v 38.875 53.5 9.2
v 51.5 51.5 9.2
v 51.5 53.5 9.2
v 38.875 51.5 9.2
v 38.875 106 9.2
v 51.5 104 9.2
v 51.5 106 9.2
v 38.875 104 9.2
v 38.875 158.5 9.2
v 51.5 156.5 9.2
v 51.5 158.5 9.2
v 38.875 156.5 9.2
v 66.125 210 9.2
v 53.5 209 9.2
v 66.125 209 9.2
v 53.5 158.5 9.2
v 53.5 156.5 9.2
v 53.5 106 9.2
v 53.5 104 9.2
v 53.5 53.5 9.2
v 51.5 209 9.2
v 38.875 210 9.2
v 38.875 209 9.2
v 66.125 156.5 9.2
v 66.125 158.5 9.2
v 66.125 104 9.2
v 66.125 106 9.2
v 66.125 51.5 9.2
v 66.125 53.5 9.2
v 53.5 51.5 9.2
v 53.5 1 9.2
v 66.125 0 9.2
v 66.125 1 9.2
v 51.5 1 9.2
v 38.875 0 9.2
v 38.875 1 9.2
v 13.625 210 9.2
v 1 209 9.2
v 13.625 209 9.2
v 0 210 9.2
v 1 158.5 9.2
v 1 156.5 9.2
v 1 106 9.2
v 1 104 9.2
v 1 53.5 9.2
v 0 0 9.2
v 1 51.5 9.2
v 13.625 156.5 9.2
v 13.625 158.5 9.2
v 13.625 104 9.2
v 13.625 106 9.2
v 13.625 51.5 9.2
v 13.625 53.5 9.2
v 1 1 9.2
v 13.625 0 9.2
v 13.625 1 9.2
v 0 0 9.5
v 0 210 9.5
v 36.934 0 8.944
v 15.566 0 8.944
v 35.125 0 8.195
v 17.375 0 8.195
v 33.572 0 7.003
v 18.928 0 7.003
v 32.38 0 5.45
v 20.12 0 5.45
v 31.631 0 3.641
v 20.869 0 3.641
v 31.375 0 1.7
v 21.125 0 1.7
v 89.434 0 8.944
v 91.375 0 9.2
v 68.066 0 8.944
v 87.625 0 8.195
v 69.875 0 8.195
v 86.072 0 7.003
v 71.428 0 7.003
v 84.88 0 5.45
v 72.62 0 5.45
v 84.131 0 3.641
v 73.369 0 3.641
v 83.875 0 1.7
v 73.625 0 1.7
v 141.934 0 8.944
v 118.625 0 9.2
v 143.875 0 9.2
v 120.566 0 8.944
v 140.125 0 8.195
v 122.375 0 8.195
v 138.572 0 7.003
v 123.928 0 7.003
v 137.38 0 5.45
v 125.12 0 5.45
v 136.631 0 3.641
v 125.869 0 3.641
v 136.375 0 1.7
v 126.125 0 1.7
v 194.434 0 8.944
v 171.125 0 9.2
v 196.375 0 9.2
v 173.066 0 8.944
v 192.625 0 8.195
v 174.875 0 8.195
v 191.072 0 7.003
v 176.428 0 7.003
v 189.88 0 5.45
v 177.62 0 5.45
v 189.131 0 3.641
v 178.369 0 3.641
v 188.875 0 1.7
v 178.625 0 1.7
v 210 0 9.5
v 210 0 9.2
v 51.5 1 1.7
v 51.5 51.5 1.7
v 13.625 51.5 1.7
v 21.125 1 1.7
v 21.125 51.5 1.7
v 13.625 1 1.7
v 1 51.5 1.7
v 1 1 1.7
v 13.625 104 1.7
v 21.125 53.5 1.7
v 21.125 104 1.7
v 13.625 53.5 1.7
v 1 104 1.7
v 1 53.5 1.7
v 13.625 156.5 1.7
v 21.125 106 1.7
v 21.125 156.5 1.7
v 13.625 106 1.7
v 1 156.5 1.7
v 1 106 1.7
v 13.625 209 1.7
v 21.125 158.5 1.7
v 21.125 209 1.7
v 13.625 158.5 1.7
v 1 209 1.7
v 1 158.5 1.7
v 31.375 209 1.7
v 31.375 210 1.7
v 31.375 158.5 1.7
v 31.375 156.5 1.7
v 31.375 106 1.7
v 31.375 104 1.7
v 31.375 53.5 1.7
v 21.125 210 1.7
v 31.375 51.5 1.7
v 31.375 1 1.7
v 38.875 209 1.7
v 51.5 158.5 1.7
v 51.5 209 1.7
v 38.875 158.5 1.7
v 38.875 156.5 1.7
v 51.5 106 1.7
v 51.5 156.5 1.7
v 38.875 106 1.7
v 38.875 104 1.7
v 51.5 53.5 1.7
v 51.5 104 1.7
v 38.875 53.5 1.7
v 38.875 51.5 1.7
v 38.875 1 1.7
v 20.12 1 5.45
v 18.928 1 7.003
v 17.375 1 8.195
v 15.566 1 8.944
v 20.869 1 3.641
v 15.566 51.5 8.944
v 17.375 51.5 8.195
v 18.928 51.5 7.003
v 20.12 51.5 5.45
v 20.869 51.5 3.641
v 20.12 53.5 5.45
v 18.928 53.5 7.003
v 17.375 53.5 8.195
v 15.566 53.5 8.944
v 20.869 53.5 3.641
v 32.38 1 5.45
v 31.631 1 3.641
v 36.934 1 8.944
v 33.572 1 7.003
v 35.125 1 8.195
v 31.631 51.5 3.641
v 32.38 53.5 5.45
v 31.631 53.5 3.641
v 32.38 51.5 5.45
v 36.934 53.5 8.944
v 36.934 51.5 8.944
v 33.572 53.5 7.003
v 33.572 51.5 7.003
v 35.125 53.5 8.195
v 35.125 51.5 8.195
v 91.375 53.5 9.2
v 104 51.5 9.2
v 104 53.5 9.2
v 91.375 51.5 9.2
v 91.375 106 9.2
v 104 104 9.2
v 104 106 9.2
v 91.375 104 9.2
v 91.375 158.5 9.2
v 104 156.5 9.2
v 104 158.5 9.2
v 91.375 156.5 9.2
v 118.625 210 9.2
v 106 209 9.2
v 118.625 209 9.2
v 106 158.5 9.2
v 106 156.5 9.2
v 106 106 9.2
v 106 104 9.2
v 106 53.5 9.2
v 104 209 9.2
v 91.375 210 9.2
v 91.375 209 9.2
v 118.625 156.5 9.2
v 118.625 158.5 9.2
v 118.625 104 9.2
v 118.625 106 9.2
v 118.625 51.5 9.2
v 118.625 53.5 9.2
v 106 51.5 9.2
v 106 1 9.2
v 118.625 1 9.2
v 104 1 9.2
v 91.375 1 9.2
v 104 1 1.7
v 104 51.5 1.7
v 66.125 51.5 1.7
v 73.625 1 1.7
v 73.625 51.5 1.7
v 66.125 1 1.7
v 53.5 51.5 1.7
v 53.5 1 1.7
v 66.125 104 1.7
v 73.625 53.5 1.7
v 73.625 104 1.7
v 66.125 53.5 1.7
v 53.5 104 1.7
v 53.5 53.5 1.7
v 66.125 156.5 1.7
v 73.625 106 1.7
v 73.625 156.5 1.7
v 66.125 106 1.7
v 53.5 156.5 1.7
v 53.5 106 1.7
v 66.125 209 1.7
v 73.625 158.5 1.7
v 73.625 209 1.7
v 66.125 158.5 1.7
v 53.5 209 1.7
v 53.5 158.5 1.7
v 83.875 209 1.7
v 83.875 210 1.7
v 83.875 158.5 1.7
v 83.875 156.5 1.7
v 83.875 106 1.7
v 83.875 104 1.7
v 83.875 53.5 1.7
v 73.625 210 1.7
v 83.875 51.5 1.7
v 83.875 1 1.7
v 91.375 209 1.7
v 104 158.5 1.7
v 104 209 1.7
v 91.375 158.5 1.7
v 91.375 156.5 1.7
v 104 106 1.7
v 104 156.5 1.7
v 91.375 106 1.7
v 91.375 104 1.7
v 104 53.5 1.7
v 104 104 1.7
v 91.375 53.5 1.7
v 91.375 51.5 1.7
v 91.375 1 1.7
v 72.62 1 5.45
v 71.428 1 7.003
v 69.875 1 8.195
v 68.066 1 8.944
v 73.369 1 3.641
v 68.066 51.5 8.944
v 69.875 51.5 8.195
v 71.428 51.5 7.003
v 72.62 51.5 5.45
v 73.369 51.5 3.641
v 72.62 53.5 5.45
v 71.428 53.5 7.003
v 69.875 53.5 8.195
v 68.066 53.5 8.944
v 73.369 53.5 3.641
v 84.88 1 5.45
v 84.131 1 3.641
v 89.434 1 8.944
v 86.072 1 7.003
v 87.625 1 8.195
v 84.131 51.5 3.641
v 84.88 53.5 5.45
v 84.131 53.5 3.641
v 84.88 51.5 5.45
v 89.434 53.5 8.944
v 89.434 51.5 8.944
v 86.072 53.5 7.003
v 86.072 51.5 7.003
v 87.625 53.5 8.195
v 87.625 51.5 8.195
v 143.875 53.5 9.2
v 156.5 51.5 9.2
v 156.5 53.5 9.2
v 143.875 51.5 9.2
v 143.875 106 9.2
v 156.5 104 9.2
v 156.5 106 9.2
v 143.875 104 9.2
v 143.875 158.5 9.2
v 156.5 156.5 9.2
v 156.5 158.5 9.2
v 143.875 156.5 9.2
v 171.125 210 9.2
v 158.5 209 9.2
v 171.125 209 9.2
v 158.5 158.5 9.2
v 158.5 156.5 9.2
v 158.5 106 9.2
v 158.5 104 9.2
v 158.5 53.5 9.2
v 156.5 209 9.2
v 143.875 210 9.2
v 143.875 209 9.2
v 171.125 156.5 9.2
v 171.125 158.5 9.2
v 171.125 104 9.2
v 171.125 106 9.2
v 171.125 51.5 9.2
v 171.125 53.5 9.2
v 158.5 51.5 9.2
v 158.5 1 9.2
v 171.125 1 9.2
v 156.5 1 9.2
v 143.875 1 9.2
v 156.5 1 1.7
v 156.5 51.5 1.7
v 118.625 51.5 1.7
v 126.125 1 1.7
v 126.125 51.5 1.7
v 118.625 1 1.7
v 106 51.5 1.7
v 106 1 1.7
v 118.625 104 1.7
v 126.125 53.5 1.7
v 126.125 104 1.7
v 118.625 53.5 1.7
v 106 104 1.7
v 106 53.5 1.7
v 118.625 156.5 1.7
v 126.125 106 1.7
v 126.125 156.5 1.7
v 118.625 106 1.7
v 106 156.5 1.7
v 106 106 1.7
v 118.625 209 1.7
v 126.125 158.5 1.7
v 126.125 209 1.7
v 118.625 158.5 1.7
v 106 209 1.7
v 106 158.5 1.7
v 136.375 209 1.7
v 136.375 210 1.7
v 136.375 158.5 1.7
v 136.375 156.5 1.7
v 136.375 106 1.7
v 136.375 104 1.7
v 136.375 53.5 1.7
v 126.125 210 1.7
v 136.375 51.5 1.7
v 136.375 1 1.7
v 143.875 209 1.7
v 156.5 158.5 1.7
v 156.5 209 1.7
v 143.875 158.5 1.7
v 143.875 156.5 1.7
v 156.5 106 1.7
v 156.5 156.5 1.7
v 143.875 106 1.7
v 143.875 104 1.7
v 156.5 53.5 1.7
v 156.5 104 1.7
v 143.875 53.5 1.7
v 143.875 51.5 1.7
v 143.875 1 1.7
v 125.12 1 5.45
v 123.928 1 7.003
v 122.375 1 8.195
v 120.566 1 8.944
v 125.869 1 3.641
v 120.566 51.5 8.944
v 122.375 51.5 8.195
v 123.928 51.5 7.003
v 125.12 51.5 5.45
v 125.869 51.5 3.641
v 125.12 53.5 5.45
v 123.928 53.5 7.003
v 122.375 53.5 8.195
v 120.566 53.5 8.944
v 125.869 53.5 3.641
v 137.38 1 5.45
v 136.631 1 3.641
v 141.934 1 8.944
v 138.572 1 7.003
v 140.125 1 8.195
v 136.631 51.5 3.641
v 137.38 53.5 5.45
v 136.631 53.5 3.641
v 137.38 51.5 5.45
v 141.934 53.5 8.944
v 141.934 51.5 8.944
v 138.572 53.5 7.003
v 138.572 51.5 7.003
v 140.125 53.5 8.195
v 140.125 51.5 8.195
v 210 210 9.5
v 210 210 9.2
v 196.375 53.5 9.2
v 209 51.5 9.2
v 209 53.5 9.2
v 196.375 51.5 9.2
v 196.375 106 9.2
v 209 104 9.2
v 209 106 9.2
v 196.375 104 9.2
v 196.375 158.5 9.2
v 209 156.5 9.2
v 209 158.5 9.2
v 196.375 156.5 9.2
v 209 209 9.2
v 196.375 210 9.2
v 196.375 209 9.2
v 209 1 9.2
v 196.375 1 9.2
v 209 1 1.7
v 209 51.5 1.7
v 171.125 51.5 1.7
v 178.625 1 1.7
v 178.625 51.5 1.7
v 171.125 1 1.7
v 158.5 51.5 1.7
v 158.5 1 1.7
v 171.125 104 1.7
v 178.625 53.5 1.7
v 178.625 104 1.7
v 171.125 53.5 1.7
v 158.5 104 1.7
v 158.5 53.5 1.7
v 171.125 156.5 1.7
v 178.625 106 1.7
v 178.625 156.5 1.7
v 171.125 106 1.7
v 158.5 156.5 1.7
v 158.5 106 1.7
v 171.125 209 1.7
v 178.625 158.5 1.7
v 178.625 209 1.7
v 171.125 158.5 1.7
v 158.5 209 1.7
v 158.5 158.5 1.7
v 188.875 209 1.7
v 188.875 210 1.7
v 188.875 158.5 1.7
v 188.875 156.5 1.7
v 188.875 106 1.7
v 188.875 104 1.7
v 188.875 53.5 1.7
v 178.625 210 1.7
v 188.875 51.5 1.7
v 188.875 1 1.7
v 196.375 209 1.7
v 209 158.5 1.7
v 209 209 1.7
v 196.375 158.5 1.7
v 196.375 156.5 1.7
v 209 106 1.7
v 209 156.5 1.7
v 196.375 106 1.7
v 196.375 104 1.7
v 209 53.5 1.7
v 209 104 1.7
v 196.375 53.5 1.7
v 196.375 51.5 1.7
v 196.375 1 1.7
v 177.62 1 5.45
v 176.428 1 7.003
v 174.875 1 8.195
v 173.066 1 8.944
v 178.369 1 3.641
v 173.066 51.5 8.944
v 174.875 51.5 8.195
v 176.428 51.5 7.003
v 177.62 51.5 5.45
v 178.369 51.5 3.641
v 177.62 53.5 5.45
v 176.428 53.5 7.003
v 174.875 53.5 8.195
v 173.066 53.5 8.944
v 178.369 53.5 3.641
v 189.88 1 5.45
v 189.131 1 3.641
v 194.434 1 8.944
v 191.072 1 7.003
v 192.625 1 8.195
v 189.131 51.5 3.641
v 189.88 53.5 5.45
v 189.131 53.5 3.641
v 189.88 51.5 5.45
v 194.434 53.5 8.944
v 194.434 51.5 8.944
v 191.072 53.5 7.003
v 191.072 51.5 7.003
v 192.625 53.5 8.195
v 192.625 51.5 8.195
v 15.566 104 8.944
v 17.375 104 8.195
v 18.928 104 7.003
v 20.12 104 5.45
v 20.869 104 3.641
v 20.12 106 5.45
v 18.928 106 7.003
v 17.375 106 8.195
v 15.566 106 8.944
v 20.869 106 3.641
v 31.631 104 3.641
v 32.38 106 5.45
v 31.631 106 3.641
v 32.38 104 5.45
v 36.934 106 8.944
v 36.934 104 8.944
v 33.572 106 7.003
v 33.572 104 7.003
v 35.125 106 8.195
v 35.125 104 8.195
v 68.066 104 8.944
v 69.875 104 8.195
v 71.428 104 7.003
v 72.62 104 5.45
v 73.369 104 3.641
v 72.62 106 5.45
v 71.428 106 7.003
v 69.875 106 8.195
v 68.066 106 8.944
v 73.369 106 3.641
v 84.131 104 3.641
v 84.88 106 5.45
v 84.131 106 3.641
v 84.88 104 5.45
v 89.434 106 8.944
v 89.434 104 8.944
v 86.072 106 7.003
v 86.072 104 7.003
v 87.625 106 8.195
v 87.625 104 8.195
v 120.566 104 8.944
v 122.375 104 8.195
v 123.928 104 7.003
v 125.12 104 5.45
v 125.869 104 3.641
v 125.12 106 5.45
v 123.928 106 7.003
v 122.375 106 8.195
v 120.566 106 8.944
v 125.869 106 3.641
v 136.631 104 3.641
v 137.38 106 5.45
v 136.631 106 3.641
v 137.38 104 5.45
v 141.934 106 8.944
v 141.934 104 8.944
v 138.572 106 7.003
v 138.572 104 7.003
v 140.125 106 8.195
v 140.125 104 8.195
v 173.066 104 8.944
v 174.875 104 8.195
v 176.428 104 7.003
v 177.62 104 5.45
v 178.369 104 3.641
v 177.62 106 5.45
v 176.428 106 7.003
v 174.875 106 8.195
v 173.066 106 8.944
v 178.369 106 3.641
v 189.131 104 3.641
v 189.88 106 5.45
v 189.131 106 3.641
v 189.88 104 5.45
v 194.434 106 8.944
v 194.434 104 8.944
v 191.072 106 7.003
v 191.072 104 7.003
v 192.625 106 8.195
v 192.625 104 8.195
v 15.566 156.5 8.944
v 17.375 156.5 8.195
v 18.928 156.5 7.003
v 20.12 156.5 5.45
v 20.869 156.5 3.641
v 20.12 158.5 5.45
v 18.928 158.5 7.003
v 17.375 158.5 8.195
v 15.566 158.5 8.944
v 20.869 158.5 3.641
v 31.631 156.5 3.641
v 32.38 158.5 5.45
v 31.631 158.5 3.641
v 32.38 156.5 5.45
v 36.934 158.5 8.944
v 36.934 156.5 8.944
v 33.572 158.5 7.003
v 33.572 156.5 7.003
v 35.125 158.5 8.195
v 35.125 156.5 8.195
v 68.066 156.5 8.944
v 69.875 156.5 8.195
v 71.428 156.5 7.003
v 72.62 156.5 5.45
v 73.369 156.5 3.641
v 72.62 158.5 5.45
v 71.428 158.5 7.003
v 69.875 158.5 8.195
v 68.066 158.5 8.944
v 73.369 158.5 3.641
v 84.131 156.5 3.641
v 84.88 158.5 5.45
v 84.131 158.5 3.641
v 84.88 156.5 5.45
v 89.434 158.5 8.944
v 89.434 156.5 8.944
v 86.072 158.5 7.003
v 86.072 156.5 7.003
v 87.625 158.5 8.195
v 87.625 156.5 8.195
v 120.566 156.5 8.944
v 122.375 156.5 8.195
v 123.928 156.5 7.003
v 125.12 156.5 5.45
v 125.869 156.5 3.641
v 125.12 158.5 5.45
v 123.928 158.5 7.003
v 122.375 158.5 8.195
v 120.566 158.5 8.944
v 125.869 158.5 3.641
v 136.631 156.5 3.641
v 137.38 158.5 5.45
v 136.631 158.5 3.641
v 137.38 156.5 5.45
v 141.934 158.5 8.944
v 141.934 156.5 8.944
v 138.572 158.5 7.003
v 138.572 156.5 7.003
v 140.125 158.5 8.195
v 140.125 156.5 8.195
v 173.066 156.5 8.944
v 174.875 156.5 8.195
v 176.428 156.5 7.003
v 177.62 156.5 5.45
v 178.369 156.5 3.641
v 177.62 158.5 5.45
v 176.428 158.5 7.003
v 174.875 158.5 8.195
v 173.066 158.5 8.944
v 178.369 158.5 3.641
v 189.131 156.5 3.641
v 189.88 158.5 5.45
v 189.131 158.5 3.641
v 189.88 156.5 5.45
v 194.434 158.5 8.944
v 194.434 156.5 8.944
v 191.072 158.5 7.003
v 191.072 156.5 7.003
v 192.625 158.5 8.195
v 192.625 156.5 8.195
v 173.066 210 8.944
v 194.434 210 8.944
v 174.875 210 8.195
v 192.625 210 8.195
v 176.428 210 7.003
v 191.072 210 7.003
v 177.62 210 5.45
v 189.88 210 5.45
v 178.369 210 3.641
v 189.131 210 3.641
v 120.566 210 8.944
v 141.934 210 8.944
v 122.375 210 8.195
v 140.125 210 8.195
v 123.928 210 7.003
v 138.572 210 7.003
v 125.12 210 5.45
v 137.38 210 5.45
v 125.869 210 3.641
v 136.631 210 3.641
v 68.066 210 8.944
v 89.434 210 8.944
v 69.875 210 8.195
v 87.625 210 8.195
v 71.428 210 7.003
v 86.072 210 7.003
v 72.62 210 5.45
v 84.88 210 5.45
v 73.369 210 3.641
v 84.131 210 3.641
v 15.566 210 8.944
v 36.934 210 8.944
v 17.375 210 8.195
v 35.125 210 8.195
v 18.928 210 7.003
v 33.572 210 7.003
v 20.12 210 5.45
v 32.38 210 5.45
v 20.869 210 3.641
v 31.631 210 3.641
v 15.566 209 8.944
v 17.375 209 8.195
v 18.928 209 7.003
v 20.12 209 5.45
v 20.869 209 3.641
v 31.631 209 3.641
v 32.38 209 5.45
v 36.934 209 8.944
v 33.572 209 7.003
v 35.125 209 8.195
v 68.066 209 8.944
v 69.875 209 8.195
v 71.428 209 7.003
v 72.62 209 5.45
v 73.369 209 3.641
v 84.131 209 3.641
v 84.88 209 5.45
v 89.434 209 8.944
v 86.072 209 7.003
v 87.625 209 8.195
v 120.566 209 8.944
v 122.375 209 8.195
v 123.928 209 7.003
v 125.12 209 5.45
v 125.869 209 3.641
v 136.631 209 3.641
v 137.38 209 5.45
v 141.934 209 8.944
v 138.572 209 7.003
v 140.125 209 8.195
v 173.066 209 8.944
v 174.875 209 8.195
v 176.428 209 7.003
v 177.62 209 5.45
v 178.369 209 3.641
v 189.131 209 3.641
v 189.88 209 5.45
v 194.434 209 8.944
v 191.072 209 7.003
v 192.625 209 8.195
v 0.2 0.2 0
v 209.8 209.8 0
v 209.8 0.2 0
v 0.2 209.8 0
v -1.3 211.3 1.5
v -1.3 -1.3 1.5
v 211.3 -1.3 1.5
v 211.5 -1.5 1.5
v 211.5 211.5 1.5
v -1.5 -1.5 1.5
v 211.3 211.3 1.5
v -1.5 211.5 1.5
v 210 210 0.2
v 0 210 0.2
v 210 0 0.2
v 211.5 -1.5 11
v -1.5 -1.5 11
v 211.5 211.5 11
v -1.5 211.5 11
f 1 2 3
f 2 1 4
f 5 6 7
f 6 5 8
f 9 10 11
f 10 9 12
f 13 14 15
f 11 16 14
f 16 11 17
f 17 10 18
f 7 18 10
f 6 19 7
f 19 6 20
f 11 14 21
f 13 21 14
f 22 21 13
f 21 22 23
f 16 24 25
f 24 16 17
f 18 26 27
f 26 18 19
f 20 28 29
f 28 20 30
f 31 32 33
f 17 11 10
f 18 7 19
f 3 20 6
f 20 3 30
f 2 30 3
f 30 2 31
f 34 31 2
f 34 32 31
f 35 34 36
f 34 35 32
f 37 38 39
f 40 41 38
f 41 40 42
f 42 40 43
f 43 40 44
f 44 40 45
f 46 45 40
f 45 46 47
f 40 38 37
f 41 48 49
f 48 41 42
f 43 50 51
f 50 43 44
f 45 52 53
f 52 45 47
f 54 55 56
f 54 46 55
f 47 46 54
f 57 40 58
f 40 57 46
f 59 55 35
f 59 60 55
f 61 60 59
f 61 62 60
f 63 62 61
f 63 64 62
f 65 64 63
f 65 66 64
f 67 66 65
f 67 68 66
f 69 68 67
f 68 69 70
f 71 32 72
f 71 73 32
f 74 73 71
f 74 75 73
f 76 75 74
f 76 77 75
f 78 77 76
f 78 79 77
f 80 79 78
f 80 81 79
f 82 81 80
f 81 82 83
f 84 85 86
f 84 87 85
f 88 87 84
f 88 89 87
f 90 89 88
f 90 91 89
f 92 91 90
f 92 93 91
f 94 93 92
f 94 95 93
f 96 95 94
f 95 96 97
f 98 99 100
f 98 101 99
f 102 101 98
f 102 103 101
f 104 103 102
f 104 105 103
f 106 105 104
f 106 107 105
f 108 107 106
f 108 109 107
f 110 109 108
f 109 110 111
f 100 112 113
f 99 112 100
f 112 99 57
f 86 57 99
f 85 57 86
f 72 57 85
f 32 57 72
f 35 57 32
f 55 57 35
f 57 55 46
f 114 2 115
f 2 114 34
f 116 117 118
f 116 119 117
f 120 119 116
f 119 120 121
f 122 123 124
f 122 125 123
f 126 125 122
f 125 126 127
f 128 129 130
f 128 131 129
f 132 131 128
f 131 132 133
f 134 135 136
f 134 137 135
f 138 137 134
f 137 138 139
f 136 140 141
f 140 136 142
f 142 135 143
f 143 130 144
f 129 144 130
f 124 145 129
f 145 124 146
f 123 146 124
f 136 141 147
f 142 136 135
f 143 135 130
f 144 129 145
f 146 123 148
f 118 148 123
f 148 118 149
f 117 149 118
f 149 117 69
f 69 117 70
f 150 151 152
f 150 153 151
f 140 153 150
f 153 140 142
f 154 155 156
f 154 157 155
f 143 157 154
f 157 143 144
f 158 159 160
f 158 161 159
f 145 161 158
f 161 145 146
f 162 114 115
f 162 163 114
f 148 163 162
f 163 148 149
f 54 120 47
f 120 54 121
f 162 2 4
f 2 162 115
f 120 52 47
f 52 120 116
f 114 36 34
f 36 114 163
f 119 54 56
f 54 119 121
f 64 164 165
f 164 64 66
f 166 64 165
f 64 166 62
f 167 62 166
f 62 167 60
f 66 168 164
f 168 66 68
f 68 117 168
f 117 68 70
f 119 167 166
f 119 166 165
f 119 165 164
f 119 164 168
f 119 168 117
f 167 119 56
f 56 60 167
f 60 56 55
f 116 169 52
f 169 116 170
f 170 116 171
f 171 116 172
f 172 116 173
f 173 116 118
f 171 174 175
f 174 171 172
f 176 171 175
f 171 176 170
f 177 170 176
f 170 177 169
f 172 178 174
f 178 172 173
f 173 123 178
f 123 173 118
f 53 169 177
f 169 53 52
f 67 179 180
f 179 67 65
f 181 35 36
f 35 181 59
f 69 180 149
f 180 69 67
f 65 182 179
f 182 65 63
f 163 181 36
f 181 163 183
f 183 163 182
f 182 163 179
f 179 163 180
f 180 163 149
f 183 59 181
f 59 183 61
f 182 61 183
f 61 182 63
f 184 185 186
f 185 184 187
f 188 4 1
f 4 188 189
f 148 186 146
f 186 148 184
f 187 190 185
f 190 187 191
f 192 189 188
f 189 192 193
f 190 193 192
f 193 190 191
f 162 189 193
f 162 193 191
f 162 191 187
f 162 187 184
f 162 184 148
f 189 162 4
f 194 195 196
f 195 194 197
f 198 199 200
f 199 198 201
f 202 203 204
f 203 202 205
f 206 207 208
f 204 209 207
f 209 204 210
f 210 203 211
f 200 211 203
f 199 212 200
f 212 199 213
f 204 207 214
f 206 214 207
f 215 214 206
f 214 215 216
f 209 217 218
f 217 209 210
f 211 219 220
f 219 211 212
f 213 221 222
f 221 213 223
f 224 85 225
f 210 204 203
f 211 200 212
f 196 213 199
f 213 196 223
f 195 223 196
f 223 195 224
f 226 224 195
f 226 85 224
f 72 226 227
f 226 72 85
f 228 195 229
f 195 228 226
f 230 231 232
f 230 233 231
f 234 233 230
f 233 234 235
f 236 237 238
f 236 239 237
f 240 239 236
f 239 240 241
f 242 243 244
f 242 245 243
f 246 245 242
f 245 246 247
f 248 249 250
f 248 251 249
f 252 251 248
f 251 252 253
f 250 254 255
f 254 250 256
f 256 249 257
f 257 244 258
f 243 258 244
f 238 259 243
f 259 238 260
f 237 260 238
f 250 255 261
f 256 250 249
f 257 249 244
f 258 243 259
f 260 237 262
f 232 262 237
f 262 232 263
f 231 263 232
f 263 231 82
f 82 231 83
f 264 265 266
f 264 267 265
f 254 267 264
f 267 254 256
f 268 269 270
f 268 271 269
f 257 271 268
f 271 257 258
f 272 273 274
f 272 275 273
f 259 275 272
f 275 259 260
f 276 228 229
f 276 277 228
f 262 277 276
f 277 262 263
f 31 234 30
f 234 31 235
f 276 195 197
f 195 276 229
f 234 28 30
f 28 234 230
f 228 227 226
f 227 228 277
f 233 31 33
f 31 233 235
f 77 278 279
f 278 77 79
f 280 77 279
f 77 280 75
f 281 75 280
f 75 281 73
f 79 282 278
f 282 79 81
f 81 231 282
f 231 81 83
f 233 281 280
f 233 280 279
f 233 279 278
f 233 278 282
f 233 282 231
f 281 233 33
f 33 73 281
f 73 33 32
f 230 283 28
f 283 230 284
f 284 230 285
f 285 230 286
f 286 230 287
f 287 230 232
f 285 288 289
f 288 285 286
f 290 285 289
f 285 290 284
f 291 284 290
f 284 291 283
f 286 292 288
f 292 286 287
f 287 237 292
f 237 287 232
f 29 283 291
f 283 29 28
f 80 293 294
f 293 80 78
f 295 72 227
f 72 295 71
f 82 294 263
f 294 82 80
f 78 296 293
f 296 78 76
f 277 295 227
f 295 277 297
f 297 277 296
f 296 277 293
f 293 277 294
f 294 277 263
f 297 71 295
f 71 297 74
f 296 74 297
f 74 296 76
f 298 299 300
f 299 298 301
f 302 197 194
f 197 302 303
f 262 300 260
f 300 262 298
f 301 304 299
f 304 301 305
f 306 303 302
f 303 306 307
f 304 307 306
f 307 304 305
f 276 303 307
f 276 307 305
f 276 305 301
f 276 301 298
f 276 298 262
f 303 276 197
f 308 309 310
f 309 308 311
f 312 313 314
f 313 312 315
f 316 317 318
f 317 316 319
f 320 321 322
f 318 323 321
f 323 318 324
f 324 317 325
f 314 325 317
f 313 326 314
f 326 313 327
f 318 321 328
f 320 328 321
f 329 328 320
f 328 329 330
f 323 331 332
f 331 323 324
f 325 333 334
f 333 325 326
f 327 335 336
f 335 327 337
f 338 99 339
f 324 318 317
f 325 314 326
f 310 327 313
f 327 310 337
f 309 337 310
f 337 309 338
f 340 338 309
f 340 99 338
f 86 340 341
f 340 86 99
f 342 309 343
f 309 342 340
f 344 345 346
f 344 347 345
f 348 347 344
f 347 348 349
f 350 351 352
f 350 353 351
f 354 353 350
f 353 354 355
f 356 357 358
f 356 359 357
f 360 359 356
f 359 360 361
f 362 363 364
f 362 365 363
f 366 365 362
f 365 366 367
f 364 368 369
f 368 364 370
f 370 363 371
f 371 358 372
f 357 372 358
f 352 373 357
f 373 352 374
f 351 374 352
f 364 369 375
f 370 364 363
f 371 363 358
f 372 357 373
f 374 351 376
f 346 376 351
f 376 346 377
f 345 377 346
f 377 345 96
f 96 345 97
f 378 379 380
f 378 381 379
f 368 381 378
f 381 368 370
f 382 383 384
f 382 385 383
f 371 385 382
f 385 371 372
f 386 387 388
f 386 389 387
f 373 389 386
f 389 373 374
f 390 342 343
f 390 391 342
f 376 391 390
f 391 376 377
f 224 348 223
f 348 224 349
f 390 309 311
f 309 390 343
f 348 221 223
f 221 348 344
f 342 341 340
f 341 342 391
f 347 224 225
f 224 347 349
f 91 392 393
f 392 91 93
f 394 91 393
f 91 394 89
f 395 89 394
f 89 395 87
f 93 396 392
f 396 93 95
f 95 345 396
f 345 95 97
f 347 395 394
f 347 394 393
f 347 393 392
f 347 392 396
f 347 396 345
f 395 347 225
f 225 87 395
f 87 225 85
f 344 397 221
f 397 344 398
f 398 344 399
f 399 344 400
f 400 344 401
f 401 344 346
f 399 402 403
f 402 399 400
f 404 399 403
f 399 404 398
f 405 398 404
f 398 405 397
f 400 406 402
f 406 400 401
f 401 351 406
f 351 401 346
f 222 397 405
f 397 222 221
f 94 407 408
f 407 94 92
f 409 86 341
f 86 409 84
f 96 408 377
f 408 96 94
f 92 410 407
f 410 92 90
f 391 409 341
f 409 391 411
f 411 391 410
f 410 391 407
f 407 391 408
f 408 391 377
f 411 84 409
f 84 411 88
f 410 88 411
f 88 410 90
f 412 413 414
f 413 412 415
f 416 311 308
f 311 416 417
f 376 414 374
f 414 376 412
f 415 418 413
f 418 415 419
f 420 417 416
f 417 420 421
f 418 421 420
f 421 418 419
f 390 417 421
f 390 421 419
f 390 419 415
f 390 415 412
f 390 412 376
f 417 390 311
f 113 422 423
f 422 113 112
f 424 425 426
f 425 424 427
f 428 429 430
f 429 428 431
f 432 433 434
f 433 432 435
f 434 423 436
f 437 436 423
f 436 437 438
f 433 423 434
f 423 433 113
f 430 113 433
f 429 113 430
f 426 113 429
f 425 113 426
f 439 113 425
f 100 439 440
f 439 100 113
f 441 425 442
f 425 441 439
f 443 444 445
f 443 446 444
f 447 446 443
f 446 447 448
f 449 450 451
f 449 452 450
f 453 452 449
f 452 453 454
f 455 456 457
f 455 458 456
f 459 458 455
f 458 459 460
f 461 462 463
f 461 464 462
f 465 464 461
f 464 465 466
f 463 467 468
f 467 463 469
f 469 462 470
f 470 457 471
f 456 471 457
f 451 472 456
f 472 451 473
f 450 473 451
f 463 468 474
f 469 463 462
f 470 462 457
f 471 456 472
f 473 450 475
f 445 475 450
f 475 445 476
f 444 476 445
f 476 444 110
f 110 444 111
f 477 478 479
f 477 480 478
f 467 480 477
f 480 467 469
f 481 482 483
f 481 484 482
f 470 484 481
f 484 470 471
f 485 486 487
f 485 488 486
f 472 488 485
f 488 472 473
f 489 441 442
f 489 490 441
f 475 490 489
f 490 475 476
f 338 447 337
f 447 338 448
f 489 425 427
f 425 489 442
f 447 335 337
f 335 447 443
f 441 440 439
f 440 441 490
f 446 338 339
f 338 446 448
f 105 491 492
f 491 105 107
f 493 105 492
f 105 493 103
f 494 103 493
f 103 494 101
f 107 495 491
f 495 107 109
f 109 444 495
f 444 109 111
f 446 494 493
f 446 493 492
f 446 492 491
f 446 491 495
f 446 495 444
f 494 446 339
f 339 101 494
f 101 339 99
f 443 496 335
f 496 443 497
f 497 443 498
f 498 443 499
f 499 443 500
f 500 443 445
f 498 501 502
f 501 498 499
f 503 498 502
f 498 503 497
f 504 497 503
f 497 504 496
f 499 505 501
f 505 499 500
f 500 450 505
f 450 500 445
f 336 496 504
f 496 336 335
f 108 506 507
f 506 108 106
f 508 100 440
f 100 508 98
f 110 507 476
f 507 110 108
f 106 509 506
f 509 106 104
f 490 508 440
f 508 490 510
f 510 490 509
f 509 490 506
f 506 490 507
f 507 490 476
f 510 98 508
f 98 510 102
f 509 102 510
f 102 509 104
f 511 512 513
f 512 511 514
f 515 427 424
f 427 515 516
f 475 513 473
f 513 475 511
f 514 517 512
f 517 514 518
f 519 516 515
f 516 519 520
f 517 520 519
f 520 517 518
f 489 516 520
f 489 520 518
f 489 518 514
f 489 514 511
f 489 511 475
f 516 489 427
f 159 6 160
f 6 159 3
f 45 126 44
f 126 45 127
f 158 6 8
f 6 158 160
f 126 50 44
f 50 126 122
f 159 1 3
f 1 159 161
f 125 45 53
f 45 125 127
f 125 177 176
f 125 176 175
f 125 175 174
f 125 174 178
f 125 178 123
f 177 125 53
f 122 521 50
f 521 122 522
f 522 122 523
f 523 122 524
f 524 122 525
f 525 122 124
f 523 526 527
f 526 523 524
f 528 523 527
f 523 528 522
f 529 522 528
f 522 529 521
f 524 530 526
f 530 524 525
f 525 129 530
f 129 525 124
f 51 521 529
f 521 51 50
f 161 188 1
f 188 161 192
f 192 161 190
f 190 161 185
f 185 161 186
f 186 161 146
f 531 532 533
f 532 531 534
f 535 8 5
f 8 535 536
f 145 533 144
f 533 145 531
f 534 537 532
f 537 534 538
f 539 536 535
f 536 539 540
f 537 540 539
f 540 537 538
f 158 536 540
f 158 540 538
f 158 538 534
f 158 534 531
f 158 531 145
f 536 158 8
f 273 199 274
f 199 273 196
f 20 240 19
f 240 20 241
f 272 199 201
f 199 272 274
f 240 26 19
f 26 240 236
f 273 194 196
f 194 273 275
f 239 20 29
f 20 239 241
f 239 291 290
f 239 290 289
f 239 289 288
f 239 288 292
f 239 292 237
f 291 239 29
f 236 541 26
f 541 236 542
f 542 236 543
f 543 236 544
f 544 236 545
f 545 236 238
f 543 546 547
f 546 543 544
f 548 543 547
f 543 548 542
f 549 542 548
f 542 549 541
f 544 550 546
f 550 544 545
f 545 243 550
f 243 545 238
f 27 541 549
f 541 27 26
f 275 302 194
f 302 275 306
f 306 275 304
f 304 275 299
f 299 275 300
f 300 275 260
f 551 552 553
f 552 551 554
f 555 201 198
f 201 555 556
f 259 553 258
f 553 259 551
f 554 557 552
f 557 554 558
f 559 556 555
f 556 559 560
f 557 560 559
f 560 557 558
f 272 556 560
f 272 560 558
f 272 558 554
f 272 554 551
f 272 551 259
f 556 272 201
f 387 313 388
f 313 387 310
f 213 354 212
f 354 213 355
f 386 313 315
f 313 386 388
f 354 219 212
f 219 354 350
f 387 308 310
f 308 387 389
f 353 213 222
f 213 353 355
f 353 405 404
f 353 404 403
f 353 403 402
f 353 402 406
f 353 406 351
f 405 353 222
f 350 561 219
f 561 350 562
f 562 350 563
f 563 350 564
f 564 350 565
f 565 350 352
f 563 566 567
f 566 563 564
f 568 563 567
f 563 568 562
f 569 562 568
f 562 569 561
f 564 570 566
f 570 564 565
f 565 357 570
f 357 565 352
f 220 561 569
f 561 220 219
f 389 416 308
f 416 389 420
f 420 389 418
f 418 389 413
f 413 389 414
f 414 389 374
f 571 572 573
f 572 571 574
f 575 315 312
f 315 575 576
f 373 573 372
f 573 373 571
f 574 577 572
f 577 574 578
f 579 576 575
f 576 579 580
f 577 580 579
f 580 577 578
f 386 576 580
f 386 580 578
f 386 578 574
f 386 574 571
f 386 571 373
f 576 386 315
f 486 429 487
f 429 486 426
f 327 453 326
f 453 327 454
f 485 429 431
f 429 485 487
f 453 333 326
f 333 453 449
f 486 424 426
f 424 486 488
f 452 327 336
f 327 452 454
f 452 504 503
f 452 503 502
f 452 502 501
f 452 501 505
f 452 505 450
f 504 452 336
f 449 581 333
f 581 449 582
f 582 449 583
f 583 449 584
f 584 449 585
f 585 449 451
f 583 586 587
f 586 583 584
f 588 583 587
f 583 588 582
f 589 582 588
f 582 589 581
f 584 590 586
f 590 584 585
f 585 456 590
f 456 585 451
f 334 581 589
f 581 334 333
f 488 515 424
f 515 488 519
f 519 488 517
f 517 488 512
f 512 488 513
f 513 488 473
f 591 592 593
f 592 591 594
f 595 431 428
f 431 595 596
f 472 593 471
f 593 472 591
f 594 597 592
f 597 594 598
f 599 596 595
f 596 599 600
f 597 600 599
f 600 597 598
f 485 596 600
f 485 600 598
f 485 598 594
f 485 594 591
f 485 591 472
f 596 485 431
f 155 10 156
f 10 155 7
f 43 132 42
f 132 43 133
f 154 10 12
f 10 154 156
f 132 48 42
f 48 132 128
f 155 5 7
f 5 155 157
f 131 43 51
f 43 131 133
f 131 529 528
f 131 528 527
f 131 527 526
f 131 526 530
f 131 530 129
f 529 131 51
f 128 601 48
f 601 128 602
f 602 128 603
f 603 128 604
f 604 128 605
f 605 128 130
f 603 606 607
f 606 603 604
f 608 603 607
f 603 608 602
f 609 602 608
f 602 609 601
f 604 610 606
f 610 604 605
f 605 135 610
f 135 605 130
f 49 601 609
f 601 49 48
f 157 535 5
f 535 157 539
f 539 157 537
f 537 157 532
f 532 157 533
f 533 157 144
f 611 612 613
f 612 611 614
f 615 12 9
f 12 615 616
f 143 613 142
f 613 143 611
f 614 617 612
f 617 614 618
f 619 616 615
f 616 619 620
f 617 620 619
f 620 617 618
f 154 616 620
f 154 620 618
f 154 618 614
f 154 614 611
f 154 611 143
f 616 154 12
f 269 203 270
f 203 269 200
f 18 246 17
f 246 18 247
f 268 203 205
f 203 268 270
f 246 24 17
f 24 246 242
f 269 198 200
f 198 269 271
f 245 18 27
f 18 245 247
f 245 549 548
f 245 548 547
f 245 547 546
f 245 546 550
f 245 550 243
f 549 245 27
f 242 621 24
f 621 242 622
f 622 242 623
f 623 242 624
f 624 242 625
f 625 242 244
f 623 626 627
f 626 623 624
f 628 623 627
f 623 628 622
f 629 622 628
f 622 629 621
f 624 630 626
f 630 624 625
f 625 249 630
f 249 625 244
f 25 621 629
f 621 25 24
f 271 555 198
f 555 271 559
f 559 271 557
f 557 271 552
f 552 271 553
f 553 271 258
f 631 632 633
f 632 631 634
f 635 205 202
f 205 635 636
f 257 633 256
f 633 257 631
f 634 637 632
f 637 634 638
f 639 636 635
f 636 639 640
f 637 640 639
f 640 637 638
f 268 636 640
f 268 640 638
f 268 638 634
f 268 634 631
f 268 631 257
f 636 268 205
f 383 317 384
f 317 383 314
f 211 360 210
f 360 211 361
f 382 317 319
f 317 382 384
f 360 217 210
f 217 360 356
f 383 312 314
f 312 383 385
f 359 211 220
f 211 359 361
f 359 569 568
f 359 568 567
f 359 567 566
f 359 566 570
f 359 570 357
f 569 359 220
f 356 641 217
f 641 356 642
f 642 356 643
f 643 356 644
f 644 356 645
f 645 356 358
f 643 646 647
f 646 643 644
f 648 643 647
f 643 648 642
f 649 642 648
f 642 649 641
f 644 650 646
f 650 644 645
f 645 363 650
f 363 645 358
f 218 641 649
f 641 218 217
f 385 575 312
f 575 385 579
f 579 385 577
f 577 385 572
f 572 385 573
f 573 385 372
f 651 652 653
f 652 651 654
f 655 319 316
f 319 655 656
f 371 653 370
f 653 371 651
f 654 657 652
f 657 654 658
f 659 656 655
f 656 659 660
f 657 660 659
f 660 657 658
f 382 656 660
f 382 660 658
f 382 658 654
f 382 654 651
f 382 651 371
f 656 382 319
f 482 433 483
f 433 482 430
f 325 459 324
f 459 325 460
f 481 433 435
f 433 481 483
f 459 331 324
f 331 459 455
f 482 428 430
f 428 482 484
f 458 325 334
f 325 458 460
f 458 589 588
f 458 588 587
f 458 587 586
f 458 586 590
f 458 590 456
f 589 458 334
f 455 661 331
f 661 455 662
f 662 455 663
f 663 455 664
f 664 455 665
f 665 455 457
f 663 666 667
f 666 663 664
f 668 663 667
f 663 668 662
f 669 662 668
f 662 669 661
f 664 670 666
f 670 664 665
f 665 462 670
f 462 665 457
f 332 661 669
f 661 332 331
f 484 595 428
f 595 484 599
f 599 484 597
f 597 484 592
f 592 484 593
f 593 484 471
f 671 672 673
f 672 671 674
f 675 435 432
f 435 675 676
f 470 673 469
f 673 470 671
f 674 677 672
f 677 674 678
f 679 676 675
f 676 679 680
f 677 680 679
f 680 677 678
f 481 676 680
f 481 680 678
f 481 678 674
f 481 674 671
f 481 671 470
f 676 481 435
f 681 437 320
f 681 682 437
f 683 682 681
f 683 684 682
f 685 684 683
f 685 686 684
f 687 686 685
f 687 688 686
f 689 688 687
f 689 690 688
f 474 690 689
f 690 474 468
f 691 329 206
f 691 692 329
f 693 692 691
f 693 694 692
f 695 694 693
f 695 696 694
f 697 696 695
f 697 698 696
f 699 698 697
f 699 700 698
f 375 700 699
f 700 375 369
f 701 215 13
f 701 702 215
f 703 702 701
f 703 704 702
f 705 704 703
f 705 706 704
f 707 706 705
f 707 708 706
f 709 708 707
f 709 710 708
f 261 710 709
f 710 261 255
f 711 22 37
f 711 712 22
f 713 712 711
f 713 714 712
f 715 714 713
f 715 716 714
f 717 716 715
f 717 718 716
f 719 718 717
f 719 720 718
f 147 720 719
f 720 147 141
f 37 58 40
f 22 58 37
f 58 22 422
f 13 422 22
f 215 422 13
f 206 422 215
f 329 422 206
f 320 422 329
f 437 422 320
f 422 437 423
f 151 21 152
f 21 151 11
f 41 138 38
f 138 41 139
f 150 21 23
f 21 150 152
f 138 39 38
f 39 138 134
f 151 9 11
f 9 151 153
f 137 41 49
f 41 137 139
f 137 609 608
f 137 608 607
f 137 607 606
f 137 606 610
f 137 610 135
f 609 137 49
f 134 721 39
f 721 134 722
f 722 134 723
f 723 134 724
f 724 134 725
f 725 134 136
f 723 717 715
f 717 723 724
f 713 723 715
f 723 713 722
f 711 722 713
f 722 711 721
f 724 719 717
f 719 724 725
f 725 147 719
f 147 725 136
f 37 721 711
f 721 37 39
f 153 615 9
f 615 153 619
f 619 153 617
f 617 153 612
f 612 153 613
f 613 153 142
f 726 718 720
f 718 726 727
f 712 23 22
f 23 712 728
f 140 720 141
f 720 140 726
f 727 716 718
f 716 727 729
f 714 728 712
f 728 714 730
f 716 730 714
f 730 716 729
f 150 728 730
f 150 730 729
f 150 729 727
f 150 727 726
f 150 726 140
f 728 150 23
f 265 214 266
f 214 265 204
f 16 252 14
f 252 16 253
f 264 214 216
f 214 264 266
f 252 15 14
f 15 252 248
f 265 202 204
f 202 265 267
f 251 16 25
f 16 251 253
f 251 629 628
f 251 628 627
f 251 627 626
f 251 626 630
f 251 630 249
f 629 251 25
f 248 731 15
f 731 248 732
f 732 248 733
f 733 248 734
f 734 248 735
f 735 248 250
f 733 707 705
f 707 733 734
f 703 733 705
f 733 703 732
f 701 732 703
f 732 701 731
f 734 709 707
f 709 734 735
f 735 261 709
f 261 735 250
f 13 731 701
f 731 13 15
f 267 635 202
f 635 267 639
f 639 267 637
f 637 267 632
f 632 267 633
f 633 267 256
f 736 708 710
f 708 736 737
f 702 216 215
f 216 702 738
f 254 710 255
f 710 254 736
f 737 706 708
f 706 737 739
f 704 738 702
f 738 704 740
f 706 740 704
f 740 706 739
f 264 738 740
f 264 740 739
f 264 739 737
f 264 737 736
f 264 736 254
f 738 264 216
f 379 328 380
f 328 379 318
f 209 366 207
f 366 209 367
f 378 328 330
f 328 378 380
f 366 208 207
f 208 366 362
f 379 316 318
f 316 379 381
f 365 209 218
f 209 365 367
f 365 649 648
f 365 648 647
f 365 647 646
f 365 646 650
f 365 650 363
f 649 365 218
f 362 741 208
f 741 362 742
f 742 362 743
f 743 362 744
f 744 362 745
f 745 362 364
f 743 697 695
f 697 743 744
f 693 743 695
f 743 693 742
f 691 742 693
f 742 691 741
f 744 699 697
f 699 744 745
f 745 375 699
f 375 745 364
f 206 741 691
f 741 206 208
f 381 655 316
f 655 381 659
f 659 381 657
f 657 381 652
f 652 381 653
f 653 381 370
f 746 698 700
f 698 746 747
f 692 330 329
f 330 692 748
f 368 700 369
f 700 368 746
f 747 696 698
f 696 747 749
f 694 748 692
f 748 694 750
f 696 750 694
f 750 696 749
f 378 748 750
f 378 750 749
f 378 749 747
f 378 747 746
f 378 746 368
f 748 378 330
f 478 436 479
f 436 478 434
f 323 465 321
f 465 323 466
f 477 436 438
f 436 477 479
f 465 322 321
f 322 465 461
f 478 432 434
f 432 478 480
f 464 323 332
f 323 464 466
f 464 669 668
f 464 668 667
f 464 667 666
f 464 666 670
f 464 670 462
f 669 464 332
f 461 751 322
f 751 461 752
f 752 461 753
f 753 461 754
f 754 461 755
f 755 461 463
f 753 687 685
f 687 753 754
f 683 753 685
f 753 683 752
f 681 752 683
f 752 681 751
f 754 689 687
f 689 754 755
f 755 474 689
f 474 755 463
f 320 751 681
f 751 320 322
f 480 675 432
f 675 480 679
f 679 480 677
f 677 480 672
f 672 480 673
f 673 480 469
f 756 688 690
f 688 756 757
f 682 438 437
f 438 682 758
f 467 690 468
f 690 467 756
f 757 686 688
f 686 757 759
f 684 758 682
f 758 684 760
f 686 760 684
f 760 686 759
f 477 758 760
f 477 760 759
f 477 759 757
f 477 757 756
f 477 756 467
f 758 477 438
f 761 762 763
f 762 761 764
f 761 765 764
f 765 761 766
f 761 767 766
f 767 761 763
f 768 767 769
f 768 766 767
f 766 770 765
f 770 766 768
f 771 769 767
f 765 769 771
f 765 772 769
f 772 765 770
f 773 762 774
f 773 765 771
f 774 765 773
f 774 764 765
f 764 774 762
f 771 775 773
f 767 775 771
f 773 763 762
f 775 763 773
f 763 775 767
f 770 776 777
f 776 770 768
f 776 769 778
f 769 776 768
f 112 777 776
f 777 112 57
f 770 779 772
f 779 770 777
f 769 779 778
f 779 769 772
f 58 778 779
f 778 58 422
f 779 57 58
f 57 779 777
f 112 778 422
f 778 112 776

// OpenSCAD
// Number of rows
rows=4;
// Number of columns
columns=4;
// Separation between slots
slot_separation=2.0;

// Size of the slots
size=50.0;
// Inner padding for the slots
size_padding = 0.5;
// Depth of the slots
depth=7.5;

// Width of the walls
wall=1.5;

print_box = true;
print_lid = false;

/* [Hidden] */
inner_size = size+size_padding;
total_size = inner_size + slot_separation;
external_x_size = inner_size*rows+slot_separation*rows;
external_y_size = inner_size*columns+slot_separation*columns;
tolerance = 0.2;

module pieSlice(a, r, h){
  // a:angle, r:radius, h:height
  rotate_extrude(angle=a) square([r,h]);
}

module slot() {
    union() {
        difference() {
            cube([inner_size+slot_separation, inner_size+slot_separation, depth+wall]);
            translate([slot_separation/2,slot_separation/2,wall])cube([inner_size, inner_size, depth]);
            translate([(slot_separation/2)+inner_size/4,0,wall])cube([inner_size/2,inner_size+slot_separation, depth]);
        }
        //linear_extrude(wall)circle(depth);
        translate([(slot_separation/2)+inner_size/4,slot_separation/2,wall]) rotate([90,0,0]) pieSlice(90, depth, slot_separation/2);
        translate([(slot_separation/2)+inner_size/4,slot_separation+inner_size,wall]) rotate([90,0,0]) pieSlice(90, depth, slot_separation/2);
        translate([(inner_size+slot_separation)-slot_separation/2-inner_size/4,0,wall])rotate([90,0,180]) pieSlice(90, depth, slot_separation/2);
        translate([(inner_size+slot_separation)-slot_separation/2-inner_size/4,slot_separation/2+inner_size,wall])rotate([90,0,180]) pieSlice(90, depth, slot_separation/2);
    }
}

module outer_wall(lenght) {
    linear_extrude(lenght) {
        polygon(points = [[0,0],[wall,0],[wall,depth+size_padding],[0,depth+size_padding+wall]]);
    }   
}

module row () {
    for (i = [0:columns-1]) {
        translate([total_size*i,0,tolerance]) slot();
    }    
}

module base() {
polyhedron(points=[[tolerance,tolerance,0],
                   [external_x_size-tolerance,tolerance,0],
                   [external_x_size-tolerance,external_y_size-tolerance,0],
                   [tolerance,external_y_size-tolerance,0],
                   [-wall+tolerance,-wall+tolerance,wall],
                   [external_x_size+wall-tolerance,-wall+tolerance,wall],
                   [external_x_size+wall-tolerance,external_y_size+wall-tolerance,wall],
                   [-wall+tolerance,external_y_size+wall-tolerance,wall]],
           faces=[[0,1,2,3],
                  [7,6,5,4],
                  [5,6,2,1],
                  [6,7,3,2],
                  [7,4,0,3],
                  [4,5,1,0]]);
}

if (print_box == true) {

for (i = [0:rows-1]) {  
    translate([0,total_size*i,0])row();
}

// Base
base();

// External walls
translate([-wall,-wall,wall]) rotate([90,0,90]) outer_wall(external_x_size+wall*2);
translate([external_x_size+wall,external_y_size+wall,wall]) rotate([90,0,-90]) outer_wall(external_x_size+wall*2);
translate([-wall,external_y_size+wall,wall]) rotate([90,0,0]) outer_wall(external_x_size+wall*2);
translate([external_x_size+wall,-wall,wall]) rotate([90,0,180]) outer_wall(external_x_size+wall*2);

}

if (print_lid == true) {
    translate ([external_x_size+wall*2+15,0,0])
    union() {
        base();
        translate([-wall,-wall,wall]) cube([external_x_size+wall*2, external_y_size+wall*2, wall/2]);
    }
}
